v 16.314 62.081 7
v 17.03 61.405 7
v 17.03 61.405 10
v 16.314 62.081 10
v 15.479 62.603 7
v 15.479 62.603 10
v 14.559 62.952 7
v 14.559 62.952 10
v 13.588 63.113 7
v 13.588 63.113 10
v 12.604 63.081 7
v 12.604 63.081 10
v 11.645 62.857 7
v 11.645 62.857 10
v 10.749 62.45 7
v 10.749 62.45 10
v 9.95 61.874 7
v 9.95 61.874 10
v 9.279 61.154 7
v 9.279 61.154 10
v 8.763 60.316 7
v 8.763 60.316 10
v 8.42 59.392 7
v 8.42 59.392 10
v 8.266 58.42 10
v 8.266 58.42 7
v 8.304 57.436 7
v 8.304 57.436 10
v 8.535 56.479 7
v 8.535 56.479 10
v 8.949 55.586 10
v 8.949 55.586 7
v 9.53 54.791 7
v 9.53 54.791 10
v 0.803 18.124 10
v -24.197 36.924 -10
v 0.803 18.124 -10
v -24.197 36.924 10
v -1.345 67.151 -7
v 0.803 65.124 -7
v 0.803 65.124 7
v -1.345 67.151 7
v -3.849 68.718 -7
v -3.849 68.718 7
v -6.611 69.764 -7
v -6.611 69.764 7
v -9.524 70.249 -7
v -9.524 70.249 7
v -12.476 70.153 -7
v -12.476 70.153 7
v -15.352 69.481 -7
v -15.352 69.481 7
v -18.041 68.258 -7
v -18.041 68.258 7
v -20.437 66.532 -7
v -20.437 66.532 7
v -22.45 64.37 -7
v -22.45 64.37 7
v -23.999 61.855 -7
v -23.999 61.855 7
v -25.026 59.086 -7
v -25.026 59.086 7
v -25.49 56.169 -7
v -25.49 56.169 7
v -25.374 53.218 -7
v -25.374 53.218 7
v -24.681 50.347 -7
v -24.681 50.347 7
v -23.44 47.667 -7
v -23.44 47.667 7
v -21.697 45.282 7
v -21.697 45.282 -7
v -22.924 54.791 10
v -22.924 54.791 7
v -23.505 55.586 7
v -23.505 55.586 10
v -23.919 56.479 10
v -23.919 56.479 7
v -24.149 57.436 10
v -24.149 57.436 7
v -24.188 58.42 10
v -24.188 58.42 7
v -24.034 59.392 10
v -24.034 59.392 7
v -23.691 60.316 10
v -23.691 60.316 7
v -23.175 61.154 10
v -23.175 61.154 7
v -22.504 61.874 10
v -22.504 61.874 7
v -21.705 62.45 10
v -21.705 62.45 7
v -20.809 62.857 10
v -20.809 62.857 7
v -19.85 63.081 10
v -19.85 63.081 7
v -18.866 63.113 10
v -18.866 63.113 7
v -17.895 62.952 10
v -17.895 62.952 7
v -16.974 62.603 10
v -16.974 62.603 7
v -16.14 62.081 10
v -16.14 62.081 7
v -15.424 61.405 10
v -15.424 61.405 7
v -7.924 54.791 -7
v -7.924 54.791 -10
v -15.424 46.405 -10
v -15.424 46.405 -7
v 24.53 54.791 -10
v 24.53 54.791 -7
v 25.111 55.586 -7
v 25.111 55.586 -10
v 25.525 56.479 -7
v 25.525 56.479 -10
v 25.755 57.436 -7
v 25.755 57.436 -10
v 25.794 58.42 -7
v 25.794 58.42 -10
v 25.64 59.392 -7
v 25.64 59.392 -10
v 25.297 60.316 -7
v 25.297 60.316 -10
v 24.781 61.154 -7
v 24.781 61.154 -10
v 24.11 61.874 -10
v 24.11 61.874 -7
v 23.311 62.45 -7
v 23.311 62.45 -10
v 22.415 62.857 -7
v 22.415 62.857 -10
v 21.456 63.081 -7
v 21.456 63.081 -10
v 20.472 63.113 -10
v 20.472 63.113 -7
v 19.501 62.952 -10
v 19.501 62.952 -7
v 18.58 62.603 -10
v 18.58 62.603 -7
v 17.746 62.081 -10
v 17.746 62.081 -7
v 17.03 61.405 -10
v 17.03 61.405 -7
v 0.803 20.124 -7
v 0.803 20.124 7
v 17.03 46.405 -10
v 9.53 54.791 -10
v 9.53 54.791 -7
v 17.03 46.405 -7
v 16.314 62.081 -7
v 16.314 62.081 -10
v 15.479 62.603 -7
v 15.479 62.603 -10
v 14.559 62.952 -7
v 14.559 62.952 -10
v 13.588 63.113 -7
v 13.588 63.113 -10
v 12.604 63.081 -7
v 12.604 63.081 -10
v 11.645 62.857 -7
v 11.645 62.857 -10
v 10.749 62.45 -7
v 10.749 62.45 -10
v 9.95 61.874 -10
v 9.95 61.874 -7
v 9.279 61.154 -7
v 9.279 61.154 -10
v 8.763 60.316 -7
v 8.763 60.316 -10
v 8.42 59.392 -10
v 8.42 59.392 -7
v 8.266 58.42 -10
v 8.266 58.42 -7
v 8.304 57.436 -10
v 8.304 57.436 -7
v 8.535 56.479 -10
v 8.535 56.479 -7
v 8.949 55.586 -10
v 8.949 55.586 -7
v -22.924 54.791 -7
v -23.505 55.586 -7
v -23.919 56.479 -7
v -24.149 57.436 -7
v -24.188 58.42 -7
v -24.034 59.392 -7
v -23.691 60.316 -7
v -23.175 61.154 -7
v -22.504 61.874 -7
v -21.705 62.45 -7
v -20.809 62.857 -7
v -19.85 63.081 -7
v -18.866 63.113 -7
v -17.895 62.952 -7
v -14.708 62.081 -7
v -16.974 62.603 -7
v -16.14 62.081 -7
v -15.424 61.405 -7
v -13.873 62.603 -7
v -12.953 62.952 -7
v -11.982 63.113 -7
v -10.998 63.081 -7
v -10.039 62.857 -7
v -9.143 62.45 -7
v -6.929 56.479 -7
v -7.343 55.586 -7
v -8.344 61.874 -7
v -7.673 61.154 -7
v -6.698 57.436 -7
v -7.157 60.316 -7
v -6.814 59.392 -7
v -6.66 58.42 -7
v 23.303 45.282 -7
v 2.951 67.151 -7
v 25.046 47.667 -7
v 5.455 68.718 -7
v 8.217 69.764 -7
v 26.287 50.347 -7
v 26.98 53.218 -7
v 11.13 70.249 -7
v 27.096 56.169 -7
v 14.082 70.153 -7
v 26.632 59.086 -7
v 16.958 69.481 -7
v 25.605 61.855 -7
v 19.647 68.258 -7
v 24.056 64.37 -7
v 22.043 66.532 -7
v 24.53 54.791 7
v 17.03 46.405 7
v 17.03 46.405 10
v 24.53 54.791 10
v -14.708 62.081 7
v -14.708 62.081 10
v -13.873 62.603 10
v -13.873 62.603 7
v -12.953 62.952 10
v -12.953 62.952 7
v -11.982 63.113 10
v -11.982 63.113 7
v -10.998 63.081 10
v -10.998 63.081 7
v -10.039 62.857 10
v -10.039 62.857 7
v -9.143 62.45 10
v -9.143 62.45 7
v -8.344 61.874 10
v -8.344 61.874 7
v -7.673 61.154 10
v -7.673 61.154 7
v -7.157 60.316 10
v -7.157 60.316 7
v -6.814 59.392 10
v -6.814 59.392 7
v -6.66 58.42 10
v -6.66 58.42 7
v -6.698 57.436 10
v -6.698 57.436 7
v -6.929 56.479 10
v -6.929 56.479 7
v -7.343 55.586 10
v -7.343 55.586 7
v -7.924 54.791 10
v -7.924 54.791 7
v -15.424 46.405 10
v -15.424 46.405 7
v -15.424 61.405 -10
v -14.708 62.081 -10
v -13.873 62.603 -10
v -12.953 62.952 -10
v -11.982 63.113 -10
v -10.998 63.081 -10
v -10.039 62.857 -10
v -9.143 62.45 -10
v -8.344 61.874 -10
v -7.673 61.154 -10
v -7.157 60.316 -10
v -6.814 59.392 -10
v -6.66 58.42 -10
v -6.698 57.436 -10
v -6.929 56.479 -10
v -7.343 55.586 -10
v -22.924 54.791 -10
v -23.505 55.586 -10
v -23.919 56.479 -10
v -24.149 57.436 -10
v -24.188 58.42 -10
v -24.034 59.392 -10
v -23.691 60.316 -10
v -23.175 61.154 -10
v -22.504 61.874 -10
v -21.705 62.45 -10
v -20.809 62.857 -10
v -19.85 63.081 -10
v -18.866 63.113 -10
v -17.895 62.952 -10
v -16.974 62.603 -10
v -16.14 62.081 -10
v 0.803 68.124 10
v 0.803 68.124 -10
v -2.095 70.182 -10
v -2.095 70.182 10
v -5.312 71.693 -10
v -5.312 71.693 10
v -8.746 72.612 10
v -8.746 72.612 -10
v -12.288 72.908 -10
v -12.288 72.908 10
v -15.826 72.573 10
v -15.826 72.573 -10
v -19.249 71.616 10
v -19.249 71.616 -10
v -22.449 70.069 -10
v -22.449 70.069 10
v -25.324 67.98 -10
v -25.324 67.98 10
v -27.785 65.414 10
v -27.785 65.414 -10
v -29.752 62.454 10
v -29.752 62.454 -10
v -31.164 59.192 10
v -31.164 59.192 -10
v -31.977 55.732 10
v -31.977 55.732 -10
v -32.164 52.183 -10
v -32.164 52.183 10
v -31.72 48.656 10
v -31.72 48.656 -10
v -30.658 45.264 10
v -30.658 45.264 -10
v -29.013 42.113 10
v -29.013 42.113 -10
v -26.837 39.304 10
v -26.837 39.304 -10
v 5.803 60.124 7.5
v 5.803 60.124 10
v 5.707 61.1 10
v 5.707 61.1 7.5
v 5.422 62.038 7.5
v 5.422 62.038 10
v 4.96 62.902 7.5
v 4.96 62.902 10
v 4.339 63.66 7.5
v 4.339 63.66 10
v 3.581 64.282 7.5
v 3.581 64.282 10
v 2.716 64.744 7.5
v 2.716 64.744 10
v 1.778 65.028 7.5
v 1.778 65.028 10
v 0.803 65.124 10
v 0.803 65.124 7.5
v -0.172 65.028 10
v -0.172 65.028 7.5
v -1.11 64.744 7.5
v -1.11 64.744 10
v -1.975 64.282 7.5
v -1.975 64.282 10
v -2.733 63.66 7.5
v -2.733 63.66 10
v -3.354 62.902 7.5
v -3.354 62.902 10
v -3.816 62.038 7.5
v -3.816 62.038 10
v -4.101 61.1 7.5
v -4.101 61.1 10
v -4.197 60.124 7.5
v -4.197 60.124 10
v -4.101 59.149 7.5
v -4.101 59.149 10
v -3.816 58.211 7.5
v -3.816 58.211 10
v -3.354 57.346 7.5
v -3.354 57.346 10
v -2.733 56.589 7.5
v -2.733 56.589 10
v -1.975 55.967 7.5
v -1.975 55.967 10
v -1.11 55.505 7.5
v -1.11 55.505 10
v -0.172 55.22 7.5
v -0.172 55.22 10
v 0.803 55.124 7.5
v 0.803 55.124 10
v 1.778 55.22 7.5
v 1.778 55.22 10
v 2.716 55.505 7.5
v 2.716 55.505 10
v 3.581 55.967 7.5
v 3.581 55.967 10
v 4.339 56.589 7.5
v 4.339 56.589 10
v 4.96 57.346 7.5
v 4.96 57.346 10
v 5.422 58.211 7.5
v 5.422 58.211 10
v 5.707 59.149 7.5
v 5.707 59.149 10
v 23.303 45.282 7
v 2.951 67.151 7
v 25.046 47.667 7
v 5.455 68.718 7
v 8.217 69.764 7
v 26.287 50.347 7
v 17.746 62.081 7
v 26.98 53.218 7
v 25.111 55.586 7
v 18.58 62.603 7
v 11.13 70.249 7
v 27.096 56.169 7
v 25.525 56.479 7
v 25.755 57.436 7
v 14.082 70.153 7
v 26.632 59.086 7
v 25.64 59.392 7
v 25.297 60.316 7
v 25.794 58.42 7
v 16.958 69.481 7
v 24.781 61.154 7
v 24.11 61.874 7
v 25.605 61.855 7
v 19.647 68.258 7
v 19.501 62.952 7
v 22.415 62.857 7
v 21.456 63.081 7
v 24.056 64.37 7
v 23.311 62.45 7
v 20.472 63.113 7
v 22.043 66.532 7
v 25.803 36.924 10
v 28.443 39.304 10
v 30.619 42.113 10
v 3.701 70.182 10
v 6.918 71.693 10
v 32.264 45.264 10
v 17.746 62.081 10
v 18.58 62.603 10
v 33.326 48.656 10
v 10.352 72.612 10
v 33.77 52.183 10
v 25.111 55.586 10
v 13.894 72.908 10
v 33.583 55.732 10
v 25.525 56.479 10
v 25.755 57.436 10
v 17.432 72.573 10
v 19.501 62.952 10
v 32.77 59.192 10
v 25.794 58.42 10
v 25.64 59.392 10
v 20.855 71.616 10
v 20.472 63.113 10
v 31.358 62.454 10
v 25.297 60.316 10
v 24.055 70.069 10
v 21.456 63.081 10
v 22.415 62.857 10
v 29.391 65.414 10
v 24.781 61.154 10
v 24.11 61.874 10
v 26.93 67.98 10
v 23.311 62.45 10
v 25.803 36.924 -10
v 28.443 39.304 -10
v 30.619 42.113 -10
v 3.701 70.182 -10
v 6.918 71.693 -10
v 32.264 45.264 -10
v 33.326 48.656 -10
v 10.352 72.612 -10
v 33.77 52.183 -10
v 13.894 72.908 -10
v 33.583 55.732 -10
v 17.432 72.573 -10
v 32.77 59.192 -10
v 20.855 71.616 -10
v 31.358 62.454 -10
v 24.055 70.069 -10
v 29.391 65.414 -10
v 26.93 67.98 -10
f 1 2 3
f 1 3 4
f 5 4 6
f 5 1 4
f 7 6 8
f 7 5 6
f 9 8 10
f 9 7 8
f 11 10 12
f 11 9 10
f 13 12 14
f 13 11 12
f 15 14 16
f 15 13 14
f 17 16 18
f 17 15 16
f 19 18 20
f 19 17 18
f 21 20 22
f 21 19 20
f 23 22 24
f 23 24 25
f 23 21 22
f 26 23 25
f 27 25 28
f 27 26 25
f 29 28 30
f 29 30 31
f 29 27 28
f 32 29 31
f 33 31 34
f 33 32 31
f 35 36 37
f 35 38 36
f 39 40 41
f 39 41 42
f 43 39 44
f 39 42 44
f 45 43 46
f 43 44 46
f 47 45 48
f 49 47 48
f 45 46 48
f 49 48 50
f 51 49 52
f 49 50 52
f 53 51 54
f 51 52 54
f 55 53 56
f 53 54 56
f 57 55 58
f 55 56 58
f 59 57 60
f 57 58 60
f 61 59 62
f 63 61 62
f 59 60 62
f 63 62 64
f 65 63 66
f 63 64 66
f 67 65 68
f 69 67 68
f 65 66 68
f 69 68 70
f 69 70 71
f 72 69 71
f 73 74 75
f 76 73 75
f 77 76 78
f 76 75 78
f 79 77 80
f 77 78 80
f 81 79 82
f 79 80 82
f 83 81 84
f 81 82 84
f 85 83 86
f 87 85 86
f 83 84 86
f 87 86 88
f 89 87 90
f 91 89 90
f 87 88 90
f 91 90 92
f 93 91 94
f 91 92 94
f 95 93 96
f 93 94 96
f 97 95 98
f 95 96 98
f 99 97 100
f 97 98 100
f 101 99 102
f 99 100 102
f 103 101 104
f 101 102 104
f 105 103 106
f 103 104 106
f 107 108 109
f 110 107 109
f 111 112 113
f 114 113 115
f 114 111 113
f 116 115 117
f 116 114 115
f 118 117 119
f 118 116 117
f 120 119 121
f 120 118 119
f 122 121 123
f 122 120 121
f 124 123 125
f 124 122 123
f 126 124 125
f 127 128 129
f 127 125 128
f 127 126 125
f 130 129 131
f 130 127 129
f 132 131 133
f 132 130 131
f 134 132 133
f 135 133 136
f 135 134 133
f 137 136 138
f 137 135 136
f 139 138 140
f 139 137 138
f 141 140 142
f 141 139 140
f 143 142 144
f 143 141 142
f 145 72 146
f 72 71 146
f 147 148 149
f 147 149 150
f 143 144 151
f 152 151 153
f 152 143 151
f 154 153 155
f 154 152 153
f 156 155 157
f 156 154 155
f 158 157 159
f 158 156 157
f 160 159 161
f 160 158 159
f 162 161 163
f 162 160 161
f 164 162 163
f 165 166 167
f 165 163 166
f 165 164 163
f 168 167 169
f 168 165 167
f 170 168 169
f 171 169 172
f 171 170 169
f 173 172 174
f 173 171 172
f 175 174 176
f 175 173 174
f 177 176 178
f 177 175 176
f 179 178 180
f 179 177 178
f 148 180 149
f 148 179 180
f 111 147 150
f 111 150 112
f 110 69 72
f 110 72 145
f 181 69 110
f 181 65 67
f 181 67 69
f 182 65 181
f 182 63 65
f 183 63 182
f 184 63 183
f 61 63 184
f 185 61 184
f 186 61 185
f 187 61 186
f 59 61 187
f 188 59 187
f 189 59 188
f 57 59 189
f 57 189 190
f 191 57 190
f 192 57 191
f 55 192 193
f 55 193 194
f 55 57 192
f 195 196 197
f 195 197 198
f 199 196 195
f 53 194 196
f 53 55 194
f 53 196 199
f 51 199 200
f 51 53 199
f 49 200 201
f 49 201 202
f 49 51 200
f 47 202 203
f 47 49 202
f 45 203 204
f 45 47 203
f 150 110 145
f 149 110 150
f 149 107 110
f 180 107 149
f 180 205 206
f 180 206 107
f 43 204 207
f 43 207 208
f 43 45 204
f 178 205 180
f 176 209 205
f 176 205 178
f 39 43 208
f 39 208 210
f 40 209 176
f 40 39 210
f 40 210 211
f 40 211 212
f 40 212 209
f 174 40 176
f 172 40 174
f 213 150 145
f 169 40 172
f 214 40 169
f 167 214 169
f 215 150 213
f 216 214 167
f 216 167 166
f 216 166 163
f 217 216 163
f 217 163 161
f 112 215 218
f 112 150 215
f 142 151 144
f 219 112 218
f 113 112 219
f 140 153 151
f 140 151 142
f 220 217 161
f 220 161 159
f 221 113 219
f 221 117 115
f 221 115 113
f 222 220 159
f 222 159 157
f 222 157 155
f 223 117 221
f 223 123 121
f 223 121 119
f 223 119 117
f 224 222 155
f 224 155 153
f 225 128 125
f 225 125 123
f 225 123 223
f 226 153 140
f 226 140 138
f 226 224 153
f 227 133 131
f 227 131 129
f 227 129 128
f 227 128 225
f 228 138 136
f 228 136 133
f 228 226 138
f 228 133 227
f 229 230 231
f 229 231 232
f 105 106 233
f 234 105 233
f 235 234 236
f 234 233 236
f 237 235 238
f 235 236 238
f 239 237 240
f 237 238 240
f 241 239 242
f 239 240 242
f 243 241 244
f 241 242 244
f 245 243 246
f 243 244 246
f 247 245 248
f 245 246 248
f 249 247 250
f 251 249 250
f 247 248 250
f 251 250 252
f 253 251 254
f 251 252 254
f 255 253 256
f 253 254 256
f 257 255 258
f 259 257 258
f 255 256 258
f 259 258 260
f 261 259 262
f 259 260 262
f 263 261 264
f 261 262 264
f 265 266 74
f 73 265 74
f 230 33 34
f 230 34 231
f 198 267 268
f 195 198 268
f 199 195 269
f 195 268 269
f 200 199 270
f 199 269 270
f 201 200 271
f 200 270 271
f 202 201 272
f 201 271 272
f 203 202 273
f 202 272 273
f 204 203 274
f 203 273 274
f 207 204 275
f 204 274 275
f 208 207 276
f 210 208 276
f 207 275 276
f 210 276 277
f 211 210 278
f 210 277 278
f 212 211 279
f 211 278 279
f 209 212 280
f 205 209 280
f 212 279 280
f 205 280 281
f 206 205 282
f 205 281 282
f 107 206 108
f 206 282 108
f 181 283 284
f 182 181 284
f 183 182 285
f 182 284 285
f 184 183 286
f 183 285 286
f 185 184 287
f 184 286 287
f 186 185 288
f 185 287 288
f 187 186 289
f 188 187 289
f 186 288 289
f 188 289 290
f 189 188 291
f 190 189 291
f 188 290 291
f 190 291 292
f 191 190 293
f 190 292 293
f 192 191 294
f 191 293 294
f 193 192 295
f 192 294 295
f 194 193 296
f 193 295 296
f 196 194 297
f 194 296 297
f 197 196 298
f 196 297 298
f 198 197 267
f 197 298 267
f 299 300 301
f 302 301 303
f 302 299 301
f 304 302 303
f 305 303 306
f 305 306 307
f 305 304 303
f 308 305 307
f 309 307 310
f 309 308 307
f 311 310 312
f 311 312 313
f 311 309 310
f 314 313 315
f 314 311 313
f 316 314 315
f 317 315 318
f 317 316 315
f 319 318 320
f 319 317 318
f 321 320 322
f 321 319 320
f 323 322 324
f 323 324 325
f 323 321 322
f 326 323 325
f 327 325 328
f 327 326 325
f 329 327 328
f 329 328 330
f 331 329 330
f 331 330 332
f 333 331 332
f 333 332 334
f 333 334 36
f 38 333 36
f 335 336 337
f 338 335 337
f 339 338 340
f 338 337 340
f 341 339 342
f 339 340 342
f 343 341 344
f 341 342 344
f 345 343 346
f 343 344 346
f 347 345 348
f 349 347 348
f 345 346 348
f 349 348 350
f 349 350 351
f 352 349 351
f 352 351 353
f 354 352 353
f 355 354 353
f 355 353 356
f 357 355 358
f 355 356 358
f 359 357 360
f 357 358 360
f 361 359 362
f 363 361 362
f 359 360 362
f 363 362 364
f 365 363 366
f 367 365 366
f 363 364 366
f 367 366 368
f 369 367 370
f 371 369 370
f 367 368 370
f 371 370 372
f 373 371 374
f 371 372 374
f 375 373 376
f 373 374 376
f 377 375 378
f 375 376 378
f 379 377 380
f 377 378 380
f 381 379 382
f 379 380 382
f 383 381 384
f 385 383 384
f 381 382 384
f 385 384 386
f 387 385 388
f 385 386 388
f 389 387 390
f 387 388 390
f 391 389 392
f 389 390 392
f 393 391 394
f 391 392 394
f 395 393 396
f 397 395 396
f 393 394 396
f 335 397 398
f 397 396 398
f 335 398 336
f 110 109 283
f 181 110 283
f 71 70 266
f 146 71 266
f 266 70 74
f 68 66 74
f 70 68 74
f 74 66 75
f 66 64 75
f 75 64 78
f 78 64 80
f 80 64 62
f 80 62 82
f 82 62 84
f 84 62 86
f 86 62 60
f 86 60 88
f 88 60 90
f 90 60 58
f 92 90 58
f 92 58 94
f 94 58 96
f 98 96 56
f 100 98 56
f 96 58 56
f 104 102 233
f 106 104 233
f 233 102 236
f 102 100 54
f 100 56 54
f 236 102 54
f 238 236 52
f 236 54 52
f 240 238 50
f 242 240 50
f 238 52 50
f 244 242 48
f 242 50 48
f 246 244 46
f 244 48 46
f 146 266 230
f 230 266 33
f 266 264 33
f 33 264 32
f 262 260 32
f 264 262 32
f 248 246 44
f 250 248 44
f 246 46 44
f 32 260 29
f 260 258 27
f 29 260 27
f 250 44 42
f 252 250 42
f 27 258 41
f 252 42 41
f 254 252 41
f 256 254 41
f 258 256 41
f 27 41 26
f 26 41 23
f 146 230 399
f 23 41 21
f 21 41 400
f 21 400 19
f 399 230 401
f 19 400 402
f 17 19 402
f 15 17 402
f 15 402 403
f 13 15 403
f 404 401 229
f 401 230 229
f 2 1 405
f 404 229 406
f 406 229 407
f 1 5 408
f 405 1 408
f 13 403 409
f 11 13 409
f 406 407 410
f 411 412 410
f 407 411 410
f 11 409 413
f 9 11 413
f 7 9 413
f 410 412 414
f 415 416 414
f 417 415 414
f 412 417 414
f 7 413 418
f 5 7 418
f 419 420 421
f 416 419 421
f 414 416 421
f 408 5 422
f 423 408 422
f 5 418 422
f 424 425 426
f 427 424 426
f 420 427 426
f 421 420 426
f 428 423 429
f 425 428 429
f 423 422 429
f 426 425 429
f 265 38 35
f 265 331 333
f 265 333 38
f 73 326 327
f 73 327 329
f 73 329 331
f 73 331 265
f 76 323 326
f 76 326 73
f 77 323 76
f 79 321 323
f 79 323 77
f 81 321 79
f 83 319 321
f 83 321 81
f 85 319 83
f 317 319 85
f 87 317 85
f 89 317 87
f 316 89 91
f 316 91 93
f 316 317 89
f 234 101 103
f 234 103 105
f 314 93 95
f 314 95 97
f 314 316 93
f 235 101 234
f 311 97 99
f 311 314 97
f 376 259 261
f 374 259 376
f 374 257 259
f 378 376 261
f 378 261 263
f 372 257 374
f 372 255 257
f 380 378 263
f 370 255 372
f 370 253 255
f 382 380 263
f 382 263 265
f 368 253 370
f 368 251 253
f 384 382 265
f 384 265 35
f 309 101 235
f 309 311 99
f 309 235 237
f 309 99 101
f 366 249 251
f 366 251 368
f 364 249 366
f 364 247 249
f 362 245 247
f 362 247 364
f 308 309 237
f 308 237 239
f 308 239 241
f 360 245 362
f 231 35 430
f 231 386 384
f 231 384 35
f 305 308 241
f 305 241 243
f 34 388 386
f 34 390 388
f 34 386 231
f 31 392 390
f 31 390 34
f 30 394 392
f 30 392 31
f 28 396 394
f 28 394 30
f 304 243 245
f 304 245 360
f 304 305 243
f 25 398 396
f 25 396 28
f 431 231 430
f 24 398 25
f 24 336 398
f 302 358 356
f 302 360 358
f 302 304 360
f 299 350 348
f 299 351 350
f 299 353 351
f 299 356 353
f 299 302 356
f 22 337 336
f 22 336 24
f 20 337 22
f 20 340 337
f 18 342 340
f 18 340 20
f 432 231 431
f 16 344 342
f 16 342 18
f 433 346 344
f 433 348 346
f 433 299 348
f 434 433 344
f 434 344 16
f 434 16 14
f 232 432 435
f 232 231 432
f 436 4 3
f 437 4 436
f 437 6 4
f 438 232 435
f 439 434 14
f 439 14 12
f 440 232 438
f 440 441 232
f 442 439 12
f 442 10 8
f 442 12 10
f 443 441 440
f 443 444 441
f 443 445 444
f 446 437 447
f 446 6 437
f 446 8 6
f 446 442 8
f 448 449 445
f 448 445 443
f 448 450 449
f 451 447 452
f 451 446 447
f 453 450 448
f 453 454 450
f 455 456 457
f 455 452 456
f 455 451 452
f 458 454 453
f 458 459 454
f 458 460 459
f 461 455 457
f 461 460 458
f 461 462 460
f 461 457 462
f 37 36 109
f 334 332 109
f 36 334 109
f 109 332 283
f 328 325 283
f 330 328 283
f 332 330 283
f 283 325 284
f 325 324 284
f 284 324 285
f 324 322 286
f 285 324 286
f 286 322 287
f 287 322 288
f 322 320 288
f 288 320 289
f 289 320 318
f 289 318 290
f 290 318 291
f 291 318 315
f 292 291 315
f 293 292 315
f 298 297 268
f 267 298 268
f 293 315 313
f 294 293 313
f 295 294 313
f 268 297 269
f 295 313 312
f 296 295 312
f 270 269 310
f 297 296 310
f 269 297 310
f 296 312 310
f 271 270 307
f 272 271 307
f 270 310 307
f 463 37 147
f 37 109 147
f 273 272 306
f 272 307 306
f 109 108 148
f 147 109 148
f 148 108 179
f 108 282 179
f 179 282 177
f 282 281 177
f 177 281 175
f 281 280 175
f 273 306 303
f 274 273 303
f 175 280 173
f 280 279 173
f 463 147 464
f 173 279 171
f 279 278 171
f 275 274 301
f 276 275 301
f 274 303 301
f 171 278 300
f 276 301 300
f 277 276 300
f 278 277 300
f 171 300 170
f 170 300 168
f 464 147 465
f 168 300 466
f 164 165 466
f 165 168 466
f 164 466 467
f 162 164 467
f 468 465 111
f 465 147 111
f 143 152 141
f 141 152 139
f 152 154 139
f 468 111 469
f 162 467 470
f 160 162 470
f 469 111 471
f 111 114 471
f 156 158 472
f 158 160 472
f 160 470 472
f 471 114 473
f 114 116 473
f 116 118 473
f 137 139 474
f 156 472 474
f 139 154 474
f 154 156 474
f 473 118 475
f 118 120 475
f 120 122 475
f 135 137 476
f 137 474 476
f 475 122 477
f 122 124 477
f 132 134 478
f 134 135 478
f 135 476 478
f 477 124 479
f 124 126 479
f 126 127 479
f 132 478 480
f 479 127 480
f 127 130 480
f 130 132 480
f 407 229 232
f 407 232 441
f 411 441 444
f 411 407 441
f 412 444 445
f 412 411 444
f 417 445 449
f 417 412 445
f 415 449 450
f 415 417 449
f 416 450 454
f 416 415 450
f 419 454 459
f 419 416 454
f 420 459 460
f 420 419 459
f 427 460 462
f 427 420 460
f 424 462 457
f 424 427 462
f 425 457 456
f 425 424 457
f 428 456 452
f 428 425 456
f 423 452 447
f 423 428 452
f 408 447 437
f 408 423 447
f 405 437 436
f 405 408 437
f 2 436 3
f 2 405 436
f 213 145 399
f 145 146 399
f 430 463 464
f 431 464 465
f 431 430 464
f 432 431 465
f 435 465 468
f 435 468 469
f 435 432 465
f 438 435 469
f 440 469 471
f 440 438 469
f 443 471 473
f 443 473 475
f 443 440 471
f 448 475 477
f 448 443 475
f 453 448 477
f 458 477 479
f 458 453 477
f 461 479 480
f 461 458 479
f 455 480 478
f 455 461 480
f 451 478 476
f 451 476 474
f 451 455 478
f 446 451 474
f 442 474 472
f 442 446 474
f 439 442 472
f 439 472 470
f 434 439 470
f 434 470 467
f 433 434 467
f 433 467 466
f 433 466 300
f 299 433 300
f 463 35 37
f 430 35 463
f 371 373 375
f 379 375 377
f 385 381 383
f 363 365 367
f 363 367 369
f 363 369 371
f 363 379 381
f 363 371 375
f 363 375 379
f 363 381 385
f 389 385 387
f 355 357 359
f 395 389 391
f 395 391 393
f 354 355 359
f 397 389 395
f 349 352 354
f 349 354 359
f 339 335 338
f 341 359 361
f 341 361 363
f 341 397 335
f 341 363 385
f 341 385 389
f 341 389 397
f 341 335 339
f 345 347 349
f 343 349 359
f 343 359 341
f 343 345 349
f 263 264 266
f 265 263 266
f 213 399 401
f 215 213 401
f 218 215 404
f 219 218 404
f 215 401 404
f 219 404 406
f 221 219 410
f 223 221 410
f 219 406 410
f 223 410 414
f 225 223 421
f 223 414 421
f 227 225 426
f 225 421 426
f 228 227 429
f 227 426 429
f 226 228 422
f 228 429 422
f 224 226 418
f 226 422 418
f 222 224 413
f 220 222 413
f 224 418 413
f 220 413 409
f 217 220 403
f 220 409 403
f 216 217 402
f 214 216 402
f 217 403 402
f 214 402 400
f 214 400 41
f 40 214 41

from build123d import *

# Parameters (mm, degrees)
EXTRUDE_1_DEPTH     = 10
SKETCH_2_R          = 5
CUT_EXTRUDE_1_DEPTH = 2.5
CUT_EXTRUDE_2_DEPTH = 7
CUT_EXTRUDE_3_DEPTH = 20


with BuildPart() as part:
    # 草圖1 → 填料-伸長1 (new, symmetric)
    with BuildSketch(Plane.XY):
        with BuildLine():
            Line((-24.197007139, 36.923558221), (0.802992861, 18.124320865))
            Line((0.802992861, 18.124320865), (25.802992861, 36.923558221))
            ThreePointArc((25.802992861, 36.923558221), (29.390613552, 65.414346162), (0.802992861, 68.124320865))
            ThreePointArc((0.802992861, 68.124320865), (-27.78462783, 65.414346162), (-24.197007139, 36.923558221))
        make_face()
    extrude(amount=EXTRUDE_1_DEPTH, both=True)

    # 草圖2 → 除料-伸長1 (cut)
    with BuildSketch(Plane.XY.offset(10)):
        with Locations((0.802992861, 60.124320865)):
            Circle(SKETCH_2_R)
    extrude(amount=-CUT_EXTRUDE_1_DEPTH, mode=Mode.SUBTRACT)

    # 草圖3 → 除料-伸長2 (cut, symmetric)
    with BuildSketch(Plane.XY):
        with BuildLine():
            Line((0.802992861, 20.124320865), (23.302992861, 45.282290118))
            ThreePointArc((23.302992861, 45.282290118), (22.043474428, 66.532077134), (0.802992861, 65.124320865))
            ThreePointArc((0.802992861, 65.124320865), (-20.437488706, 66.532077134), (-21.697007139, 45.282290118))
            Line((-21.697007139, 45.282290118), (0.802992861, 20.124320865))
        make_face()
    extrude(amount=CUT_EXTRUDE_2_DEPTH, both=True, mode=Mode.SUBTRACT)

    # 草圖4 → 除料-伸長3 (cut)
    with BuildSketch(Plane(origin=(0, 0, -10), x_dir=(-1, 0, 0), z_dir=(0, 0, -1))):
        with BuildLine():
            Line((7.923932244, 54.791149812), (15.423932244, 46.405160061))
            Line((15.423932244, 46.405160061), (22.923932244, 54.791149812))
            ThreePointArc((22.923932244, 54.791149812), (22.504092766, 61.874412151), (15.423932244, 61.405160061))
            ThreePointArc((15.423932244, 61.405160061), (8.343771721, 61.874412151), (7.923932244, 54.791149812))
        make_face()
        with BuildLine():
            Line((-17.029917966, 46.405160061), (-24.529917966, 54.791149812))
            ThreePointArc((-24.529917966, 54.791149812), (-24.110078488, 61.874412151), (-17.029917966, 61.405160061))
            ThreePointArc((-17.029917966, 61.405160061), (-9.949757443, 61.874412151), (-9.529917966, 54.791149812))
            Line((-9.529917966, 54.791149812), (-17.029917966, 46.405160061))
        make_face()
    extrude(amount=-CUT_EXTRUDE_3_DEPTH, mode=Mode.SUBTRACT)


solid = part.part
